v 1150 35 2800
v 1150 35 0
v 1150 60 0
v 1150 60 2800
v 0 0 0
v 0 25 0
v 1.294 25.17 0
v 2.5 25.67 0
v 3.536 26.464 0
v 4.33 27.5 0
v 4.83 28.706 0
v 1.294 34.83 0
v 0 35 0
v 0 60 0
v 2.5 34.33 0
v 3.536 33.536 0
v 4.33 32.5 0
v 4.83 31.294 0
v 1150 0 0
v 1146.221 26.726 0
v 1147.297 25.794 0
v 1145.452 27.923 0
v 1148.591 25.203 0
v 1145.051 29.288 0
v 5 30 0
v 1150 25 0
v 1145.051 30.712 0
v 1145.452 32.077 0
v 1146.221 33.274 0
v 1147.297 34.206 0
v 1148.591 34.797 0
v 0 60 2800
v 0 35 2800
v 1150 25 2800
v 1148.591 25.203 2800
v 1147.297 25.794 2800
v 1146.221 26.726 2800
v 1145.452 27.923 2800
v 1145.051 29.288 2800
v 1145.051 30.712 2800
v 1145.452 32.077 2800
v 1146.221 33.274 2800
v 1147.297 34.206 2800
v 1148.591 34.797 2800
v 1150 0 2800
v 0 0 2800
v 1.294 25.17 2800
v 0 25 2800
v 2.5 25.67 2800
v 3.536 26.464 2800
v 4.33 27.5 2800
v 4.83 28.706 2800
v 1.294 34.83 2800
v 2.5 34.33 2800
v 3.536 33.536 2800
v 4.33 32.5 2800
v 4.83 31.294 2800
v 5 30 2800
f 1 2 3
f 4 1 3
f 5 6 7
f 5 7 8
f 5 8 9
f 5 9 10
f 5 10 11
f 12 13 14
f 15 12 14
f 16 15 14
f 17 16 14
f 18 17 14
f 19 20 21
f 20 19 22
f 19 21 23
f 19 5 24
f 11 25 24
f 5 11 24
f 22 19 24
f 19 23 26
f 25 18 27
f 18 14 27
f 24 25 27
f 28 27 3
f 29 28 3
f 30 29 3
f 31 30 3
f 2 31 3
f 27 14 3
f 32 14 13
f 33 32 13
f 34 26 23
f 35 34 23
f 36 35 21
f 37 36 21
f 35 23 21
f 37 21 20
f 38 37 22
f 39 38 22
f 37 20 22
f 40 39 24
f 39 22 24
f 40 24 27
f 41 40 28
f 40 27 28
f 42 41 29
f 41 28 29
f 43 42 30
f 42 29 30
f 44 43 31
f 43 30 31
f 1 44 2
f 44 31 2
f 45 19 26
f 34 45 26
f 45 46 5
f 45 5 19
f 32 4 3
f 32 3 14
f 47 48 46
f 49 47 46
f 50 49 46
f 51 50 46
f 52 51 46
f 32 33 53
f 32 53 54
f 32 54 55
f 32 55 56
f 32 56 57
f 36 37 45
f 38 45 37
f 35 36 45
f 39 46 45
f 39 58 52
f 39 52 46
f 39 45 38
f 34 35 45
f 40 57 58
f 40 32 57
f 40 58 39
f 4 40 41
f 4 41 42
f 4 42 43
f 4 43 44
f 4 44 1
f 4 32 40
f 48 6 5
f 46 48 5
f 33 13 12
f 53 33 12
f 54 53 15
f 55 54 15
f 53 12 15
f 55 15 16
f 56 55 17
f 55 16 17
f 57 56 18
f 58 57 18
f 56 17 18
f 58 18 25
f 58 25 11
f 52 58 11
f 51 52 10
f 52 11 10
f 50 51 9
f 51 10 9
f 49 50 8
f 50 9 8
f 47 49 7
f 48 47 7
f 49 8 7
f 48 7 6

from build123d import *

# Parameters (mm, degrees)
F1_DEPTH = 2800


with BuildPart() as f1:
    # F0 (on Top) → F1 (new body)
    with BuildSketch(Plane.XY):
        with BuildLine():
            Line((0, 25), (0, 0))
            Line((0, 0), (1150, 0))
            Line((1150, 0), (1150, 25))
            ThreePointArc((1150, 25), (1145, 30), (1150, 35))
            Line((1150, 35), (1150, 60))
            Line((1150, 60), (0, 60))
            Line((0, 60), (0, 35))
            ThreePointArc((0, 35), (3.535534, 33.535534), (5, 30))
            ThreePointArc((5, 30), (3.535534, 26.464466), (0, 25))
        make_face()
    extrude(amount=F1_DEPTH)


solid = f1.part
